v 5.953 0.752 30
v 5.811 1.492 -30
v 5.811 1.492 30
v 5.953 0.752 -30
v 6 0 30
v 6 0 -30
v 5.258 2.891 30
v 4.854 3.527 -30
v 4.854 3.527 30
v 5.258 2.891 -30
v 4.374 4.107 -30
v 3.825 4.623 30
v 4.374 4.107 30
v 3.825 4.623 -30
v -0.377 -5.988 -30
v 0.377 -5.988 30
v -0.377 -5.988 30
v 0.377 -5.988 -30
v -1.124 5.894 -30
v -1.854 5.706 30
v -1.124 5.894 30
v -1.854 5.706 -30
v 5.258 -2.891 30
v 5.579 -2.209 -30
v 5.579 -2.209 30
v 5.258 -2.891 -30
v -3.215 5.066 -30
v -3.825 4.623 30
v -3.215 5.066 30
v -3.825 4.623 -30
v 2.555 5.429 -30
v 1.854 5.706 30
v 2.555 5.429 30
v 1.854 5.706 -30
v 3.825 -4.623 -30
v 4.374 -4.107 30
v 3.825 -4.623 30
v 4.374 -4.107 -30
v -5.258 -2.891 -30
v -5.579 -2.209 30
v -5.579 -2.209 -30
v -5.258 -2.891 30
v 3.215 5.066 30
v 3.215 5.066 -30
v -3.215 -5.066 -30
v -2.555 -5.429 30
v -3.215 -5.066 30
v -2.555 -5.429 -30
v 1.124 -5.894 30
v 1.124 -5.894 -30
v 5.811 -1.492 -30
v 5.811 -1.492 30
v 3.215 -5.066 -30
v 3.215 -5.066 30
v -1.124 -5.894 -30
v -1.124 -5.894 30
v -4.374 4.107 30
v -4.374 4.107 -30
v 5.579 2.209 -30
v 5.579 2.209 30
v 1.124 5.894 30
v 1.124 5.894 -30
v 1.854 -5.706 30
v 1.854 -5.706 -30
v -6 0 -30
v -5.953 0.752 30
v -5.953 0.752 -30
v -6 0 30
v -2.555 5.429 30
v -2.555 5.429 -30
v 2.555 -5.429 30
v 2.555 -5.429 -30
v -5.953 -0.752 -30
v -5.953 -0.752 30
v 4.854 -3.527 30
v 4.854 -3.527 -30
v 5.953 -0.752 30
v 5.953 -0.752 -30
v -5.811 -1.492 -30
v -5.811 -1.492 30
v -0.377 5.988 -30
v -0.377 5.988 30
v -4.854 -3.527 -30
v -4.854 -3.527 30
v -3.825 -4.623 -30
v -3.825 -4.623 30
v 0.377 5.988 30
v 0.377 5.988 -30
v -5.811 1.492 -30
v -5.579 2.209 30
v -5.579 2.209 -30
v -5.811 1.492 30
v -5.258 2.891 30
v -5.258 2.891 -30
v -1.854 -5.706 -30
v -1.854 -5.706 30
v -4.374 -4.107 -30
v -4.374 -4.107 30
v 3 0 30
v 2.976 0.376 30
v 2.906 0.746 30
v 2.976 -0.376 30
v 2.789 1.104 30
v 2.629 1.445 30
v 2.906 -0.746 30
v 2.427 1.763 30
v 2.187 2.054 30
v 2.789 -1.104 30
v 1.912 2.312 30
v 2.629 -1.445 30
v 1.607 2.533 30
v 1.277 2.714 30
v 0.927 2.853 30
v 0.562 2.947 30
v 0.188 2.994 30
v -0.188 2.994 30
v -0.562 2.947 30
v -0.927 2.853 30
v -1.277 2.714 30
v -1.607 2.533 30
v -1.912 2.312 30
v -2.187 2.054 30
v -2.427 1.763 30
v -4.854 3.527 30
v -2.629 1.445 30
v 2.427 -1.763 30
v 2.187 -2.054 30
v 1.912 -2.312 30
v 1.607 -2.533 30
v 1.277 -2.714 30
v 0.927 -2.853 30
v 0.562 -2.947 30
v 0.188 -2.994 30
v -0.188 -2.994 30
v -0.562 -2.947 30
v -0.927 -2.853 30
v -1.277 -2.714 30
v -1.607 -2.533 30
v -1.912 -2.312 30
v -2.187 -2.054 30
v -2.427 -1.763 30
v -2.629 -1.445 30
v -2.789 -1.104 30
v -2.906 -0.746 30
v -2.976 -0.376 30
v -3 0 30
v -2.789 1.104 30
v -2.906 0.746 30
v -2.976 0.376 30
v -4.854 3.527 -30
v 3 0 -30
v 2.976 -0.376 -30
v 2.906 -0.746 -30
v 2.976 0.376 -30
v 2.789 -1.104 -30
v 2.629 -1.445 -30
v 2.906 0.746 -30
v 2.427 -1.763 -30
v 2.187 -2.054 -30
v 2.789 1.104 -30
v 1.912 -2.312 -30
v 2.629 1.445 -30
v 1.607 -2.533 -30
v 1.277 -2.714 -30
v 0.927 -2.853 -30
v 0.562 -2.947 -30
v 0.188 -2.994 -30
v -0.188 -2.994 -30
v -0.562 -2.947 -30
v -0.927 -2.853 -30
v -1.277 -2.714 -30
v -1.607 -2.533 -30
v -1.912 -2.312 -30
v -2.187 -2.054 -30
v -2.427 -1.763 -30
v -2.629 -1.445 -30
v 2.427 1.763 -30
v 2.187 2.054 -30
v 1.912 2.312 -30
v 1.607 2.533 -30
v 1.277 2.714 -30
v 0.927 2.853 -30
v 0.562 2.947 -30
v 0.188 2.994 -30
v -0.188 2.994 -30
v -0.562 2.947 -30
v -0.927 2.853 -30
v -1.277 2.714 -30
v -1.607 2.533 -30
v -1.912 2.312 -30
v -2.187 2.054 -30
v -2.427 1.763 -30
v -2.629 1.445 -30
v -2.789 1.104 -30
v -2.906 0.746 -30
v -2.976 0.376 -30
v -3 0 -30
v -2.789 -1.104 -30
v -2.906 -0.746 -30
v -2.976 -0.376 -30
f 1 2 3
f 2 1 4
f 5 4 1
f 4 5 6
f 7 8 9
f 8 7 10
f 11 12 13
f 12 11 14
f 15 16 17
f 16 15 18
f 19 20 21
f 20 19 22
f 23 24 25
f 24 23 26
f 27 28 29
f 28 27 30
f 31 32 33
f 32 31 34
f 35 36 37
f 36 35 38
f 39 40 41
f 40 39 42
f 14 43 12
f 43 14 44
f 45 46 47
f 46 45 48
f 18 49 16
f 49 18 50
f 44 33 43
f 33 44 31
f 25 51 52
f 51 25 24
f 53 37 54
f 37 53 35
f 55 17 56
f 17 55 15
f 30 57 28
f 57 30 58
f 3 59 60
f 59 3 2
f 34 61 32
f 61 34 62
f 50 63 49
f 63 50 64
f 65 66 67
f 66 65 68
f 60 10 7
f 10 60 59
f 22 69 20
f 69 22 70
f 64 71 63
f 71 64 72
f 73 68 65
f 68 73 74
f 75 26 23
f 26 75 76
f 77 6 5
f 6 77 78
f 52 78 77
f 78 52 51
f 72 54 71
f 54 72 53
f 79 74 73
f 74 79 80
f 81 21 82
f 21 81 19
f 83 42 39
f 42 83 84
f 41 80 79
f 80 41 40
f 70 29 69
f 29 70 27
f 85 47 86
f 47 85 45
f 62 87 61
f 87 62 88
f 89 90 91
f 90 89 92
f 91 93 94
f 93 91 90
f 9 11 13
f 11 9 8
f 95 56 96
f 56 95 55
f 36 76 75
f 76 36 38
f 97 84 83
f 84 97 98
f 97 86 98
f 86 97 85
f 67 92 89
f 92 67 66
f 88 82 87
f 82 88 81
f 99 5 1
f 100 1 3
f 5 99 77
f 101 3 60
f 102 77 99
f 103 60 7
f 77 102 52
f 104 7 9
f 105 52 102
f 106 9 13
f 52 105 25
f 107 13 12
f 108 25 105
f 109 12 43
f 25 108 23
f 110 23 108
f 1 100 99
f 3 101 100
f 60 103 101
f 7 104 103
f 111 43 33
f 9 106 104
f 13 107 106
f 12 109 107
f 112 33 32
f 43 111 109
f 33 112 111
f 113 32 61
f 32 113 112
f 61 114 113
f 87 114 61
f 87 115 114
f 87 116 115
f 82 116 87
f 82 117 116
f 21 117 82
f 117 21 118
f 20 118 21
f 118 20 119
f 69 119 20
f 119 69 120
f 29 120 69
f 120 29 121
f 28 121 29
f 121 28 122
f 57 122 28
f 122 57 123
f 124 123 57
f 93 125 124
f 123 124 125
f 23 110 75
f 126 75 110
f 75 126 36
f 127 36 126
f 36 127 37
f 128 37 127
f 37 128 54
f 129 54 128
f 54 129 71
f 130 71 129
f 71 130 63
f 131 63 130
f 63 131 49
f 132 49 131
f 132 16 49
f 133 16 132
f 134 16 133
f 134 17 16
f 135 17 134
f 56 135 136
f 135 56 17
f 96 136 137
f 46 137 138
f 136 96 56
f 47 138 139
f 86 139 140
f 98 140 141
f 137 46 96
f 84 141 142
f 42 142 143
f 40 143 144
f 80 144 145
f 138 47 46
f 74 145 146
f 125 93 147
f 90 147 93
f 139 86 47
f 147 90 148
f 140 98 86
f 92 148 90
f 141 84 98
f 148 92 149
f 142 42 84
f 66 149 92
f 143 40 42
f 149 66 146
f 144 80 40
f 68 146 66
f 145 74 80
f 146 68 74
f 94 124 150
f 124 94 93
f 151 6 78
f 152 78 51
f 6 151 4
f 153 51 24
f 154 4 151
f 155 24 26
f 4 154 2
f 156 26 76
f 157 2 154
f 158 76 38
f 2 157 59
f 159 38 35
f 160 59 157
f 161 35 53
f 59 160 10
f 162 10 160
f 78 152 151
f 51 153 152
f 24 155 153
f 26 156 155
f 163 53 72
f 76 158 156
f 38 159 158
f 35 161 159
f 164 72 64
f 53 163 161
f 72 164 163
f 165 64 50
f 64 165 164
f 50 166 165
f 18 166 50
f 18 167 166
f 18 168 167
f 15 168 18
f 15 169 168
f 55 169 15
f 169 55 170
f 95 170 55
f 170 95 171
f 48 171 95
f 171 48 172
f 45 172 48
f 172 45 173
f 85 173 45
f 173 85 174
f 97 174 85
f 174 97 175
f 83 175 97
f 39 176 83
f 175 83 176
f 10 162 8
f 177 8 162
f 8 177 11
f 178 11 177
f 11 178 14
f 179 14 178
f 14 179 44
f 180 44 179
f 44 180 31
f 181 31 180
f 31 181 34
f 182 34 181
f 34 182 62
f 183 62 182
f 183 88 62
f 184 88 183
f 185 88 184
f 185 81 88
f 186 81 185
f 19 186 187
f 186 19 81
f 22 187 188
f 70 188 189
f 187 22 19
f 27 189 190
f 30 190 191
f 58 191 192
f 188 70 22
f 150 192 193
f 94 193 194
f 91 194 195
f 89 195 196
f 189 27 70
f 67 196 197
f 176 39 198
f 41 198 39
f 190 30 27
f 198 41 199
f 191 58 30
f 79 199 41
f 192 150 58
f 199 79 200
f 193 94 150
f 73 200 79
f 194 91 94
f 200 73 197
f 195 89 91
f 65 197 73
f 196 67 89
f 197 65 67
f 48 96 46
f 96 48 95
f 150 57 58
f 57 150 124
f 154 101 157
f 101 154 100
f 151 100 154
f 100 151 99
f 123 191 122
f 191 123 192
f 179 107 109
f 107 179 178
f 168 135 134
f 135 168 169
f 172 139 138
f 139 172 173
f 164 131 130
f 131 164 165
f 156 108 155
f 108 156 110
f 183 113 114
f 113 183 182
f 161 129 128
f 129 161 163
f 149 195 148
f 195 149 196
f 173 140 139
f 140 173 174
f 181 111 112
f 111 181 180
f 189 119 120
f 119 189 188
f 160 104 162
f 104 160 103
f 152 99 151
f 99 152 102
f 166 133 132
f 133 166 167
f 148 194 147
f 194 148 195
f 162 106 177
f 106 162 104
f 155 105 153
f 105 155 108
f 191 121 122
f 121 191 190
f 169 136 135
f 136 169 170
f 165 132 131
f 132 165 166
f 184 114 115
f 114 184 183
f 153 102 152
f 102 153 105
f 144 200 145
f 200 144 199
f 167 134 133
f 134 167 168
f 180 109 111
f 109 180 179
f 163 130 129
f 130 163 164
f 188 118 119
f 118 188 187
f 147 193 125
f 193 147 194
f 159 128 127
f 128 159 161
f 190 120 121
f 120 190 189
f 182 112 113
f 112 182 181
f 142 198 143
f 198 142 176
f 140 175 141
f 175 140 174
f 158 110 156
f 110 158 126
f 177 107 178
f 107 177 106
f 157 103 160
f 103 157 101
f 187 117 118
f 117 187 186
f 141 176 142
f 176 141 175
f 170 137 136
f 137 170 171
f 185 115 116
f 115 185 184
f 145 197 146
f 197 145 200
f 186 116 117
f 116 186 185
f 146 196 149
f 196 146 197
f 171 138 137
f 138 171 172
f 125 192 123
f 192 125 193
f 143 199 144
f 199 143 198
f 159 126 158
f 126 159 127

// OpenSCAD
$fn = 50;


difference() {
	union() {
		translate(v = [0, 0, -30.0000000000]) {
			cylinder(h = 60, r = 6.0000000000);
		}
	}
	union() {
		translate(v = [0, 0, -100.0000000000]) {
			cylinder(h = 200, r = 3.0000000000);
		}
	}
}
